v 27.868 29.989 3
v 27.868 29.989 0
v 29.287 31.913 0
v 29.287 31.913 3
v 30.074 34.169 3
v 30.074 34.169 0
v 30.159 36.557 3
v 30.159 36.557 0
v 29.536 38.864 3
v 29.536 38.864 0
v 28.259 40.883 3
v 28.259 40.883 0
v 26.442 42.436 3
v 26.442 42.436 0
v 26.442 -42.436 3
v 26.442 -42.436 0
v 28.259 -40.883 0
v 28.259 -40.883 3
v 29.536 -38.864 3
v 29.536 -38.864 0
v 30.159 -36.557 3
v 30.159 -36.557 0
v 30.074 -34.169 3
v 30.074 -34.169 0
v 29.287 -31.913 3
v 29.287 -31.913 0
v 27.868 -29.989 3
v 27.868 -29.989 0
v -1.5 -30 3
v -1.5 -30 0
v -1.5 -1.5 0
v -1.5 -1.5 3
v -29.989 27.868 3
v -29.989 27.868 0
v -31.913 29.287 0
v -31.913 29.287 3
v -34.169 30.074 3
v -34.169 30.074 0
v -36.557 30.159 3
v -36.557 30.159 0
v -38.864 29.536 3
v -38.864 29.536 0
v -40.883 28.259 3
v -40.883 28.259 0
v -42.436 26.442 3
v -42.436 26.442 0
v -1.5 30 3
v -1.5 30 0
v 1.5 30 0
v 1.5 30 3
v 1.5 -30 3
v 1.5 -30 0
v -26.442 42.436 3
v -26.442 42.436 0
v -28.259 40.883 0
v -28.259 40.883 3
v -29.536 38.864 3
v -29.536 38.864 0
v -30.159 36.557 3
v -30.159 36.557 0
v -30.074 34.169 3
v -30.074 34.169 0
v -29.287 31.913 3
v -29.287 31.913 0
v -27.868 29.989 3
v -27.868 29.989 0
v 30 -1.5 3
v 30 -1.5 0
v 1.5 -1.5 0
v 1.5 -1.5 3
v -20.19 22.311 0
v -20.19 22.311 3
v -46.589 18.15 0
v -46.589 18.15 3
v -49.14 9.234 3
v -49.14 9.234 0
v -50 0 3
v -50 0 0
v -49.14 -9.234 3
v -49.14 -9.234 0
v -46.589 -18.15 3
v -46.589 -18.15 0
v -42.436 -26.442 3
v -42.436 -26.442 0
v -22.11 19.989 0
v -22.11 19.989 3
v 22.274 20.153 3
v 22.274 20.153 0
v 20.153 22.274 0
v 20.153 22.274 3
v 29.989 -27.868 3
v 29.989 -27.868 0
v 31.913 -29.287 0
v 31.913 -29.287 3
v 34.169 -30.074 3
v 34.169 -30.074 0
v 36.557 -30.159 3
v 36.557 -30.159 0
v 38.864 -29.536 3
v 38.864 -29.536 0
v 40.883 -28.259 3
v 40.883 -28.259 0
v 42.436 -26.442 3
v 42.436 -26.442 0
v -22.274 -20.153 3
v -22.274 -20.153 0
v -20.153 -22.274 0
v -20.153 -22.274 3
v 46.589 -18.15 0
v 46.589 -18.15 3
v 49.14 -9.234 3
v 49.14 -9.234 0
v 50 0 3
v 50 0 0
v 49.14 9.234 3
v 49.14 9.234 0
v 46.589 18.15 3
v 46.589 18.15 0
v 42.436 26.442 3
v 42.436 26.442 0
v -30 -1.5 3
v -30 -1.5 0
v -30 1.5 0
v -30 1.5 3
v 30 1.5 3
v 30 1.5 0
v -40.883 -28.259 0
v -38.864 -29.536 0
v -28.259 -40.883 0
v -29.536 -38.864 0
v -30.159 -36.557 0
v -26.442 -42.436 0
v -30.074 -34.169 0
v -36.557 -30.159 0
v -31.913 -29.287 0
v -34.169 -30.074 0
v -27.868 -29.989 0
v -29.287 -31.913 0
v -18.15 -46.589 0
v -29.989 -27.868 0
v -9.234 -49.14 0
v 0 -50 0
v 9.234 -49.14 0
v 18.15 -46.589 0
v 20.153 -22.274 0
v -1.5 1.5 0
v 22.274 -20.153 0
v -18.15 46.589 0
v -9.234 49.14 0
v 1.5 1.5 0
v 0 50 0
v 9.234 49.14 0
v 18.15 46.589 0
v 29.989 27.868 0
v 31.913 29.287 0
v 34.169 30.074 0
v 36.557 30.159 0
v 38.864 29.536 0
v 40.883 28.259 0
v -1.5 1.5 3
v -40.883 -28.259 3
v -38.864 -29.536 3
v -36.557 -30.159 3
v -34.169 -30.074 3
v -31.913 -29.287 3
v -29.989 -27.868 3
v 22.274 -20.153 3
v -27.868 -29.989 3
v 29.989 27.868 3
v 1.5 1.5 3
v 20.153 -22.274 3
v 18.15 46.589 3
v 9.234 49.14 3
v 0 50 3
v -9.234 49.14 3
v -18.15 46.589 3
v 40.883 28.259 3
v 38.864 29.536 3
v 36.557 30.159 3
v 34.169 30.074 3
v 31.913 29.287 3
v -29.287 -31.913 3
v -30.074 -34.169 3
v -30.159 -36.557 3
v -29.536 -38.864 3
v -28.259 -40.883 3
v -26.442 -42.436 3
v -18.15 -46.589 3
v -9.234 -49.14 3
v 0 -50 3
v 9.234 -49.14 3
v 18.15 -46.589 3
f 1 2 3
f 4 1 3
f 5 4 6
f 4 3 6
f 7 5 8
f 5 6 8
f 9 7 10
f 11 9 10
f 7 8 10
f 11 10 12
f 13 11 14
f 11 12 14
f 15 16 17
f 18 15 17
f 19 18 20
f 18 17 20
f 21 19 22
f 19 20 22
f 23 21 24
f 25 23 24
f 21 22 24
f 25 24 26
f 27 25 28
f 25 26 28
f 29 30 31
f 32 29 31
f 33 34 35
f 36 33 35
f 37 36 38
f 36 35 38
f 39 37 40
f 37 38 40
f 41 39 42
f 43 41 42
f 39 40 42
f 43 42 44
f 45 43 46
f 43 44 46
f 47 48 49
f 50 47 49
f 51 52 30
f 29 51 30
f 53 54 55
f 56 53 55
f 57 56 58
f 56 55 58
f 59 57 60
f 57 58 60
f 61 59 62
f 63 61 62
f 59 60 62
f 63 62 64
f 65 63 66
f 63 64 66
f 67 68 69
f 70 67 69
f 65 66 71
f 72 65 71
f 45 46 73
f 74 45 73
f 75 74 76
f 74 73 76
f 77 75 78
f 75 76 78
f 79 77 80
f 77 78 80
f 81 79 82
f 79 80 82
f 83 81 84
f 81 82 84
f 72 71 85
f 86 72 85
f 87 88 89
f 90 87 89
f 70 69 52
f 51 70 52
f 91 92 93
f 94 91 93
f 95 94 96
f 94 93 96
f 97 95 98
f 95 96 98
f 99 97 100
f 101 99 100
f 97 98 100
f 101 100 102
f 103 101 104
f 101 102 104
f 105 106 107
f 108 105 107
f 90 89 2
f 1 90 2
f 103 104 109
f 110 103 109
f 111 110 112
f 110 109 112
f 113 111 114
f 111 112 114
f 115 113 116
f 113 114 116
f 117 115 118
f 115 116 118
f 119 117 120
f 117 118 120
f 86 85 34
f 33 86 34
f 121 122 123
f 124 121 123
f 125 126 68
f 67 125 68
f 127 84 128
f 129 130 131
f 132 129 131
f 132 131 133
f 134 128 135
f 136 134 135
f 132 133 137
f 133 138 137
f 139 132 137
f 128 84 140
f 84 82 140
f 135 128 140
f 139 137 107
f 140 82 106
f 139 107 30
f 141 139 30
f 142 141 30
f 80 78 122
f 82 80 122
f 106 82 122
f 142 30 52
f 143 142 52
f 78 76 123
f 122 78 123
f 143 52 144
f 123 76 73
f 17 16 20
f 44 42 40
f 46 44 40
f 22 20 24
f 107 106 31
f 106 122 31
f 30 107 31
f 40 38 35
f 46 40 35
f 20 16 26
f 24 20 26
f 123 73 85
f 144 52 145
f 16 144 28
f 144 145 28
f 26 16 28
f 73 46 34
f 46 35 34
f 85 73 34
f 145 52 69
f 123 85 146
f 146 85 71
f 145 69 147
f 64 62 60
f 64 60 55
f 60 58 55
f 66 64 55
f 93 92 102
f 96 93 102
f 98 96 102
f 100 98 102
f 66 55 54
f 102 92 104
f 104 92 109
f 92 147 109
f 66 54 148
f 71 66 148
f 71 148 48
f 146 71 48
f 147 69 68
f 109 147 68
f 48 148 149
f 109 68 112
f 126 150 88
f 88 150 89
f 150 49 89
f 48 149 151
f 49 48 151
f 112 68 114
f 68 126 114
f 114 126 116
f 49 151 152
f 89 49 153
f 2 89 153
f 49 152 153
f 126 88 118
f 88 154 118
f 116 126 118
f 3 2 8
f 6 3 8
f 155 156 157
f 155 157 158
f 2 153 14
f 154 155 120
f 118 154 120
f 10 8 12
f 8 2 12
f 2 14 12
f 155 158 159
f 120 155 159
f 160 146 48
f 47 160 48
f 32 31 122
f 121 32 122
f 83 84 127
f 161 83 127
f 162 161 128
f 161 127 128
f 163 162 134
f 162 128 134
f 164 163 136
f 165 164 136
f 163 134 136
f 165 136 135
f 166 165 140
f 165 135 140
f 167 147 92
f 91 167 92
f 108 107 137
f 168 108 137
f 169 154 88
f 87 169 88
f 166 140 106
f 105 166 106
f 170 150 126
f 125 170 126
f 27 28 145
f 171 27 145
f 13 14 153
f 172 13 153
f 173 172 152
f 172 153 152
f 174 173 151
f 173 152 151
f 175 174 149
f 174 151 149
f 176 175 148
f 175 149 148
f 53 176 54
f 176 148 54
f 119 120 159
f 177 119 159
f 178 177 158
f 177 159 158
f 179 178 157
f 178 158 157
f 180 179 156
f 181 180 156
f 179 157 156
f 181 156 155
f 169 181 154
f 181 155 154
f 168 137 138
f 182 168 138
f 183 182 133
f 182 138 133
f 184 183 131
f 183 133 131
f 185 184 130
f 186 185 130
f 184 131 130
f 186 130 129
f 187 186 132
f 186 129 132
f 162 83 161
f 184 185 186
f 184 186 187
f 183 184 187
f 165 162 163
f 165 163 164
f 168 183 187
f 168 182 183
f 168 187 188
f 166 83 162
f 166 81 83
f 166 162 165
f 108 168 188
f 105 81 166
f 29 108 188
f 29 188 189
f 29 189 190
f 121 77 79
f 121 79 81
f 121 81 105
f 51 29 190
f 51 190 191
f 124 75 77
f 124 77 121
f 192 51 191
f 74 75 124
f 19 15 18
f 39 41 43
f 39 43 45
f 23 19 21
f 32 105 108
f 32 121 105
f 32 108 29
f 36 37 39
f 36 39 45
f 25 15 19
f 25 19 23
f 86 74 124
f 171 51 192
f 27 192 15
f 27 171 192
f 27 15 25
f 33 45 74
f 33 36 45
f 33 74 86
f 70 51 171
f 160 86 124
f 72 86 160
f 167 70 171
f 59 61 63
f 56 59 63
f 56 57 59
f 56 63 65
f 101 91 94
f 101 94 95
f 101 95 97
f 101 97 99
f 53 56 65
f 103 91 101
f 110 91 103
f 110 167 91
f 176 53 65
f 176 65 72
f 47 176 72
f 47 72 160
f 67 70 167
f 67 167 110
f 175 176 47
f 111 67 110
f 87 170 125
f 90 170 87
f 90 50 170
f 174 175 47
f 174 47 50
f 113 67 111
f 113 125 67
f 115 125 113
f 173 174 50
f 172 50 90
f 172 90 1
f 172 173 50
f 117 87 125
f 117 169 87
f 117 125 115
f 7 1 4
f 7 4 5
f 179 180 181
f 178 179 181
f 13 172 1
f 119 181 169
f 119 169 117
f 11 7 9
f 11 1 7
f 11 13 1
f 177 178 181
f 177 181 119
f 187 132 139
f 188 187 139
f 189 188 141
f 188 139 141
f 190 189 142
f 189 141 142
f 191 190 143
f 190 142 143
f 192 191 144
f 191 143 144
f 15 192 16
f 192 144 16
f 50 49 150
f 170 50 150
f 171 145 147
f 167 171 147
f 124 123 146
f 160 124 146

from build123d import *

# Parameters (mm, degrees)
F1_DEPTH = 3


with BuildPart() as f1:
    # F0 (on Top) → F1 (new body)
    with BuildSketch(Plane.XY):
        with BuildLine():
            ThreePointArc((-29.98936, 27.868279), (-36.55688, 30.159424), (-42.43597, 26.442172))
            ThreePointArc((-42.43597, 26.442172), (-50, 0), (-42.43597, -26.442172))
            ThreePointArc((-42.43597, -26.442172), (-36.55688, -30.159424), (-29.98936, -27.868279))
            Line((-29.98936, -27.868279), (-22.273744, -20.152663))
            Line((-22.273744, -20.152663), (-20.152663, -22.273744))
            Line((-20.152663, -22.273744), (-27.868279, -29.98936))
            ThreePointArc((-27.868279, -29.98936), (-30.159424, -36.55688), (-26.442172, -42.43597))
            ThreePointArc((-26.442172, -42.43597), (0, -50), (26.442172, -42.43597))
            ThreePointArc((26.442172, -42.43597), (30.159424, -36.55688), (27.868279, -29.98936))
            Line((27.868279, -29.98936), (20.152663, -22.273744))
            Line((20.152663, -22.273744), (22.273744, -20.152663))
            Line((22.273744, -20.152663), (29.98936, -27.868279))
            ThreePointArc((29.98936, -27.868279), (36.55688, -30.159424), (42.43597, -26.442172))
            ThreePointArc((42.43597, -26.442172), (50, 0), (42.43597, 26.442172))
            ThreePointArc((42.43597, 26.442172), (36.55688, 30.159424), (29.98936, 27.868279))
            Line((29.98936, 27.868279), (22.273744, 20.152663))
            Line((22.273744, 20.152663), (20.152663, 22.273744))
            Line((20.152663, 22.273744), (27.868279, 29.98936))
            ThreePointArc((27.868279, 29.98936), (30.159424, 36.55688), (26.442172, 42.43597))
            ThreePointArc((26.442172, 42.43597), (0, 50), (-26.442172, 42.43597))
            ThreePointArc((-26.442172, 42.43597), (-30.159424, 36.55688), (-27.868279, 29.98936))
            Line((-27.868279, 29.98936), (-20.189875, 22.310956))
            Line((-20.189875, 22.310956), (-22.110491, 19.989409))
            Line((-22.110491, 19.989409), (-29.98936, 27.868279))
        make_face()
        Polygon((-1.5, 30), (1.5, 30), (1.5, 3.621082), (1.5, 1.5), (3.621082, 1.5), (30, 1.5), (30, -1.5), (3.621082, -1.5), (1.5, -1.5), (1.5, -3.621082), (1.5, -30), (-1.5, -30), (-1.5, -3.621082), (-1.5, -1.5), (-3.621082, -1.5), (-30, -1.5), (-30, 1.5), (-3.621082, 1.5), (-1.5, 1.5), (-1.5, 3.621082), align=None, mode=Mode.SUBTRACT)
    extrude(amount=F1_DEPTH)


solid = f1.part
